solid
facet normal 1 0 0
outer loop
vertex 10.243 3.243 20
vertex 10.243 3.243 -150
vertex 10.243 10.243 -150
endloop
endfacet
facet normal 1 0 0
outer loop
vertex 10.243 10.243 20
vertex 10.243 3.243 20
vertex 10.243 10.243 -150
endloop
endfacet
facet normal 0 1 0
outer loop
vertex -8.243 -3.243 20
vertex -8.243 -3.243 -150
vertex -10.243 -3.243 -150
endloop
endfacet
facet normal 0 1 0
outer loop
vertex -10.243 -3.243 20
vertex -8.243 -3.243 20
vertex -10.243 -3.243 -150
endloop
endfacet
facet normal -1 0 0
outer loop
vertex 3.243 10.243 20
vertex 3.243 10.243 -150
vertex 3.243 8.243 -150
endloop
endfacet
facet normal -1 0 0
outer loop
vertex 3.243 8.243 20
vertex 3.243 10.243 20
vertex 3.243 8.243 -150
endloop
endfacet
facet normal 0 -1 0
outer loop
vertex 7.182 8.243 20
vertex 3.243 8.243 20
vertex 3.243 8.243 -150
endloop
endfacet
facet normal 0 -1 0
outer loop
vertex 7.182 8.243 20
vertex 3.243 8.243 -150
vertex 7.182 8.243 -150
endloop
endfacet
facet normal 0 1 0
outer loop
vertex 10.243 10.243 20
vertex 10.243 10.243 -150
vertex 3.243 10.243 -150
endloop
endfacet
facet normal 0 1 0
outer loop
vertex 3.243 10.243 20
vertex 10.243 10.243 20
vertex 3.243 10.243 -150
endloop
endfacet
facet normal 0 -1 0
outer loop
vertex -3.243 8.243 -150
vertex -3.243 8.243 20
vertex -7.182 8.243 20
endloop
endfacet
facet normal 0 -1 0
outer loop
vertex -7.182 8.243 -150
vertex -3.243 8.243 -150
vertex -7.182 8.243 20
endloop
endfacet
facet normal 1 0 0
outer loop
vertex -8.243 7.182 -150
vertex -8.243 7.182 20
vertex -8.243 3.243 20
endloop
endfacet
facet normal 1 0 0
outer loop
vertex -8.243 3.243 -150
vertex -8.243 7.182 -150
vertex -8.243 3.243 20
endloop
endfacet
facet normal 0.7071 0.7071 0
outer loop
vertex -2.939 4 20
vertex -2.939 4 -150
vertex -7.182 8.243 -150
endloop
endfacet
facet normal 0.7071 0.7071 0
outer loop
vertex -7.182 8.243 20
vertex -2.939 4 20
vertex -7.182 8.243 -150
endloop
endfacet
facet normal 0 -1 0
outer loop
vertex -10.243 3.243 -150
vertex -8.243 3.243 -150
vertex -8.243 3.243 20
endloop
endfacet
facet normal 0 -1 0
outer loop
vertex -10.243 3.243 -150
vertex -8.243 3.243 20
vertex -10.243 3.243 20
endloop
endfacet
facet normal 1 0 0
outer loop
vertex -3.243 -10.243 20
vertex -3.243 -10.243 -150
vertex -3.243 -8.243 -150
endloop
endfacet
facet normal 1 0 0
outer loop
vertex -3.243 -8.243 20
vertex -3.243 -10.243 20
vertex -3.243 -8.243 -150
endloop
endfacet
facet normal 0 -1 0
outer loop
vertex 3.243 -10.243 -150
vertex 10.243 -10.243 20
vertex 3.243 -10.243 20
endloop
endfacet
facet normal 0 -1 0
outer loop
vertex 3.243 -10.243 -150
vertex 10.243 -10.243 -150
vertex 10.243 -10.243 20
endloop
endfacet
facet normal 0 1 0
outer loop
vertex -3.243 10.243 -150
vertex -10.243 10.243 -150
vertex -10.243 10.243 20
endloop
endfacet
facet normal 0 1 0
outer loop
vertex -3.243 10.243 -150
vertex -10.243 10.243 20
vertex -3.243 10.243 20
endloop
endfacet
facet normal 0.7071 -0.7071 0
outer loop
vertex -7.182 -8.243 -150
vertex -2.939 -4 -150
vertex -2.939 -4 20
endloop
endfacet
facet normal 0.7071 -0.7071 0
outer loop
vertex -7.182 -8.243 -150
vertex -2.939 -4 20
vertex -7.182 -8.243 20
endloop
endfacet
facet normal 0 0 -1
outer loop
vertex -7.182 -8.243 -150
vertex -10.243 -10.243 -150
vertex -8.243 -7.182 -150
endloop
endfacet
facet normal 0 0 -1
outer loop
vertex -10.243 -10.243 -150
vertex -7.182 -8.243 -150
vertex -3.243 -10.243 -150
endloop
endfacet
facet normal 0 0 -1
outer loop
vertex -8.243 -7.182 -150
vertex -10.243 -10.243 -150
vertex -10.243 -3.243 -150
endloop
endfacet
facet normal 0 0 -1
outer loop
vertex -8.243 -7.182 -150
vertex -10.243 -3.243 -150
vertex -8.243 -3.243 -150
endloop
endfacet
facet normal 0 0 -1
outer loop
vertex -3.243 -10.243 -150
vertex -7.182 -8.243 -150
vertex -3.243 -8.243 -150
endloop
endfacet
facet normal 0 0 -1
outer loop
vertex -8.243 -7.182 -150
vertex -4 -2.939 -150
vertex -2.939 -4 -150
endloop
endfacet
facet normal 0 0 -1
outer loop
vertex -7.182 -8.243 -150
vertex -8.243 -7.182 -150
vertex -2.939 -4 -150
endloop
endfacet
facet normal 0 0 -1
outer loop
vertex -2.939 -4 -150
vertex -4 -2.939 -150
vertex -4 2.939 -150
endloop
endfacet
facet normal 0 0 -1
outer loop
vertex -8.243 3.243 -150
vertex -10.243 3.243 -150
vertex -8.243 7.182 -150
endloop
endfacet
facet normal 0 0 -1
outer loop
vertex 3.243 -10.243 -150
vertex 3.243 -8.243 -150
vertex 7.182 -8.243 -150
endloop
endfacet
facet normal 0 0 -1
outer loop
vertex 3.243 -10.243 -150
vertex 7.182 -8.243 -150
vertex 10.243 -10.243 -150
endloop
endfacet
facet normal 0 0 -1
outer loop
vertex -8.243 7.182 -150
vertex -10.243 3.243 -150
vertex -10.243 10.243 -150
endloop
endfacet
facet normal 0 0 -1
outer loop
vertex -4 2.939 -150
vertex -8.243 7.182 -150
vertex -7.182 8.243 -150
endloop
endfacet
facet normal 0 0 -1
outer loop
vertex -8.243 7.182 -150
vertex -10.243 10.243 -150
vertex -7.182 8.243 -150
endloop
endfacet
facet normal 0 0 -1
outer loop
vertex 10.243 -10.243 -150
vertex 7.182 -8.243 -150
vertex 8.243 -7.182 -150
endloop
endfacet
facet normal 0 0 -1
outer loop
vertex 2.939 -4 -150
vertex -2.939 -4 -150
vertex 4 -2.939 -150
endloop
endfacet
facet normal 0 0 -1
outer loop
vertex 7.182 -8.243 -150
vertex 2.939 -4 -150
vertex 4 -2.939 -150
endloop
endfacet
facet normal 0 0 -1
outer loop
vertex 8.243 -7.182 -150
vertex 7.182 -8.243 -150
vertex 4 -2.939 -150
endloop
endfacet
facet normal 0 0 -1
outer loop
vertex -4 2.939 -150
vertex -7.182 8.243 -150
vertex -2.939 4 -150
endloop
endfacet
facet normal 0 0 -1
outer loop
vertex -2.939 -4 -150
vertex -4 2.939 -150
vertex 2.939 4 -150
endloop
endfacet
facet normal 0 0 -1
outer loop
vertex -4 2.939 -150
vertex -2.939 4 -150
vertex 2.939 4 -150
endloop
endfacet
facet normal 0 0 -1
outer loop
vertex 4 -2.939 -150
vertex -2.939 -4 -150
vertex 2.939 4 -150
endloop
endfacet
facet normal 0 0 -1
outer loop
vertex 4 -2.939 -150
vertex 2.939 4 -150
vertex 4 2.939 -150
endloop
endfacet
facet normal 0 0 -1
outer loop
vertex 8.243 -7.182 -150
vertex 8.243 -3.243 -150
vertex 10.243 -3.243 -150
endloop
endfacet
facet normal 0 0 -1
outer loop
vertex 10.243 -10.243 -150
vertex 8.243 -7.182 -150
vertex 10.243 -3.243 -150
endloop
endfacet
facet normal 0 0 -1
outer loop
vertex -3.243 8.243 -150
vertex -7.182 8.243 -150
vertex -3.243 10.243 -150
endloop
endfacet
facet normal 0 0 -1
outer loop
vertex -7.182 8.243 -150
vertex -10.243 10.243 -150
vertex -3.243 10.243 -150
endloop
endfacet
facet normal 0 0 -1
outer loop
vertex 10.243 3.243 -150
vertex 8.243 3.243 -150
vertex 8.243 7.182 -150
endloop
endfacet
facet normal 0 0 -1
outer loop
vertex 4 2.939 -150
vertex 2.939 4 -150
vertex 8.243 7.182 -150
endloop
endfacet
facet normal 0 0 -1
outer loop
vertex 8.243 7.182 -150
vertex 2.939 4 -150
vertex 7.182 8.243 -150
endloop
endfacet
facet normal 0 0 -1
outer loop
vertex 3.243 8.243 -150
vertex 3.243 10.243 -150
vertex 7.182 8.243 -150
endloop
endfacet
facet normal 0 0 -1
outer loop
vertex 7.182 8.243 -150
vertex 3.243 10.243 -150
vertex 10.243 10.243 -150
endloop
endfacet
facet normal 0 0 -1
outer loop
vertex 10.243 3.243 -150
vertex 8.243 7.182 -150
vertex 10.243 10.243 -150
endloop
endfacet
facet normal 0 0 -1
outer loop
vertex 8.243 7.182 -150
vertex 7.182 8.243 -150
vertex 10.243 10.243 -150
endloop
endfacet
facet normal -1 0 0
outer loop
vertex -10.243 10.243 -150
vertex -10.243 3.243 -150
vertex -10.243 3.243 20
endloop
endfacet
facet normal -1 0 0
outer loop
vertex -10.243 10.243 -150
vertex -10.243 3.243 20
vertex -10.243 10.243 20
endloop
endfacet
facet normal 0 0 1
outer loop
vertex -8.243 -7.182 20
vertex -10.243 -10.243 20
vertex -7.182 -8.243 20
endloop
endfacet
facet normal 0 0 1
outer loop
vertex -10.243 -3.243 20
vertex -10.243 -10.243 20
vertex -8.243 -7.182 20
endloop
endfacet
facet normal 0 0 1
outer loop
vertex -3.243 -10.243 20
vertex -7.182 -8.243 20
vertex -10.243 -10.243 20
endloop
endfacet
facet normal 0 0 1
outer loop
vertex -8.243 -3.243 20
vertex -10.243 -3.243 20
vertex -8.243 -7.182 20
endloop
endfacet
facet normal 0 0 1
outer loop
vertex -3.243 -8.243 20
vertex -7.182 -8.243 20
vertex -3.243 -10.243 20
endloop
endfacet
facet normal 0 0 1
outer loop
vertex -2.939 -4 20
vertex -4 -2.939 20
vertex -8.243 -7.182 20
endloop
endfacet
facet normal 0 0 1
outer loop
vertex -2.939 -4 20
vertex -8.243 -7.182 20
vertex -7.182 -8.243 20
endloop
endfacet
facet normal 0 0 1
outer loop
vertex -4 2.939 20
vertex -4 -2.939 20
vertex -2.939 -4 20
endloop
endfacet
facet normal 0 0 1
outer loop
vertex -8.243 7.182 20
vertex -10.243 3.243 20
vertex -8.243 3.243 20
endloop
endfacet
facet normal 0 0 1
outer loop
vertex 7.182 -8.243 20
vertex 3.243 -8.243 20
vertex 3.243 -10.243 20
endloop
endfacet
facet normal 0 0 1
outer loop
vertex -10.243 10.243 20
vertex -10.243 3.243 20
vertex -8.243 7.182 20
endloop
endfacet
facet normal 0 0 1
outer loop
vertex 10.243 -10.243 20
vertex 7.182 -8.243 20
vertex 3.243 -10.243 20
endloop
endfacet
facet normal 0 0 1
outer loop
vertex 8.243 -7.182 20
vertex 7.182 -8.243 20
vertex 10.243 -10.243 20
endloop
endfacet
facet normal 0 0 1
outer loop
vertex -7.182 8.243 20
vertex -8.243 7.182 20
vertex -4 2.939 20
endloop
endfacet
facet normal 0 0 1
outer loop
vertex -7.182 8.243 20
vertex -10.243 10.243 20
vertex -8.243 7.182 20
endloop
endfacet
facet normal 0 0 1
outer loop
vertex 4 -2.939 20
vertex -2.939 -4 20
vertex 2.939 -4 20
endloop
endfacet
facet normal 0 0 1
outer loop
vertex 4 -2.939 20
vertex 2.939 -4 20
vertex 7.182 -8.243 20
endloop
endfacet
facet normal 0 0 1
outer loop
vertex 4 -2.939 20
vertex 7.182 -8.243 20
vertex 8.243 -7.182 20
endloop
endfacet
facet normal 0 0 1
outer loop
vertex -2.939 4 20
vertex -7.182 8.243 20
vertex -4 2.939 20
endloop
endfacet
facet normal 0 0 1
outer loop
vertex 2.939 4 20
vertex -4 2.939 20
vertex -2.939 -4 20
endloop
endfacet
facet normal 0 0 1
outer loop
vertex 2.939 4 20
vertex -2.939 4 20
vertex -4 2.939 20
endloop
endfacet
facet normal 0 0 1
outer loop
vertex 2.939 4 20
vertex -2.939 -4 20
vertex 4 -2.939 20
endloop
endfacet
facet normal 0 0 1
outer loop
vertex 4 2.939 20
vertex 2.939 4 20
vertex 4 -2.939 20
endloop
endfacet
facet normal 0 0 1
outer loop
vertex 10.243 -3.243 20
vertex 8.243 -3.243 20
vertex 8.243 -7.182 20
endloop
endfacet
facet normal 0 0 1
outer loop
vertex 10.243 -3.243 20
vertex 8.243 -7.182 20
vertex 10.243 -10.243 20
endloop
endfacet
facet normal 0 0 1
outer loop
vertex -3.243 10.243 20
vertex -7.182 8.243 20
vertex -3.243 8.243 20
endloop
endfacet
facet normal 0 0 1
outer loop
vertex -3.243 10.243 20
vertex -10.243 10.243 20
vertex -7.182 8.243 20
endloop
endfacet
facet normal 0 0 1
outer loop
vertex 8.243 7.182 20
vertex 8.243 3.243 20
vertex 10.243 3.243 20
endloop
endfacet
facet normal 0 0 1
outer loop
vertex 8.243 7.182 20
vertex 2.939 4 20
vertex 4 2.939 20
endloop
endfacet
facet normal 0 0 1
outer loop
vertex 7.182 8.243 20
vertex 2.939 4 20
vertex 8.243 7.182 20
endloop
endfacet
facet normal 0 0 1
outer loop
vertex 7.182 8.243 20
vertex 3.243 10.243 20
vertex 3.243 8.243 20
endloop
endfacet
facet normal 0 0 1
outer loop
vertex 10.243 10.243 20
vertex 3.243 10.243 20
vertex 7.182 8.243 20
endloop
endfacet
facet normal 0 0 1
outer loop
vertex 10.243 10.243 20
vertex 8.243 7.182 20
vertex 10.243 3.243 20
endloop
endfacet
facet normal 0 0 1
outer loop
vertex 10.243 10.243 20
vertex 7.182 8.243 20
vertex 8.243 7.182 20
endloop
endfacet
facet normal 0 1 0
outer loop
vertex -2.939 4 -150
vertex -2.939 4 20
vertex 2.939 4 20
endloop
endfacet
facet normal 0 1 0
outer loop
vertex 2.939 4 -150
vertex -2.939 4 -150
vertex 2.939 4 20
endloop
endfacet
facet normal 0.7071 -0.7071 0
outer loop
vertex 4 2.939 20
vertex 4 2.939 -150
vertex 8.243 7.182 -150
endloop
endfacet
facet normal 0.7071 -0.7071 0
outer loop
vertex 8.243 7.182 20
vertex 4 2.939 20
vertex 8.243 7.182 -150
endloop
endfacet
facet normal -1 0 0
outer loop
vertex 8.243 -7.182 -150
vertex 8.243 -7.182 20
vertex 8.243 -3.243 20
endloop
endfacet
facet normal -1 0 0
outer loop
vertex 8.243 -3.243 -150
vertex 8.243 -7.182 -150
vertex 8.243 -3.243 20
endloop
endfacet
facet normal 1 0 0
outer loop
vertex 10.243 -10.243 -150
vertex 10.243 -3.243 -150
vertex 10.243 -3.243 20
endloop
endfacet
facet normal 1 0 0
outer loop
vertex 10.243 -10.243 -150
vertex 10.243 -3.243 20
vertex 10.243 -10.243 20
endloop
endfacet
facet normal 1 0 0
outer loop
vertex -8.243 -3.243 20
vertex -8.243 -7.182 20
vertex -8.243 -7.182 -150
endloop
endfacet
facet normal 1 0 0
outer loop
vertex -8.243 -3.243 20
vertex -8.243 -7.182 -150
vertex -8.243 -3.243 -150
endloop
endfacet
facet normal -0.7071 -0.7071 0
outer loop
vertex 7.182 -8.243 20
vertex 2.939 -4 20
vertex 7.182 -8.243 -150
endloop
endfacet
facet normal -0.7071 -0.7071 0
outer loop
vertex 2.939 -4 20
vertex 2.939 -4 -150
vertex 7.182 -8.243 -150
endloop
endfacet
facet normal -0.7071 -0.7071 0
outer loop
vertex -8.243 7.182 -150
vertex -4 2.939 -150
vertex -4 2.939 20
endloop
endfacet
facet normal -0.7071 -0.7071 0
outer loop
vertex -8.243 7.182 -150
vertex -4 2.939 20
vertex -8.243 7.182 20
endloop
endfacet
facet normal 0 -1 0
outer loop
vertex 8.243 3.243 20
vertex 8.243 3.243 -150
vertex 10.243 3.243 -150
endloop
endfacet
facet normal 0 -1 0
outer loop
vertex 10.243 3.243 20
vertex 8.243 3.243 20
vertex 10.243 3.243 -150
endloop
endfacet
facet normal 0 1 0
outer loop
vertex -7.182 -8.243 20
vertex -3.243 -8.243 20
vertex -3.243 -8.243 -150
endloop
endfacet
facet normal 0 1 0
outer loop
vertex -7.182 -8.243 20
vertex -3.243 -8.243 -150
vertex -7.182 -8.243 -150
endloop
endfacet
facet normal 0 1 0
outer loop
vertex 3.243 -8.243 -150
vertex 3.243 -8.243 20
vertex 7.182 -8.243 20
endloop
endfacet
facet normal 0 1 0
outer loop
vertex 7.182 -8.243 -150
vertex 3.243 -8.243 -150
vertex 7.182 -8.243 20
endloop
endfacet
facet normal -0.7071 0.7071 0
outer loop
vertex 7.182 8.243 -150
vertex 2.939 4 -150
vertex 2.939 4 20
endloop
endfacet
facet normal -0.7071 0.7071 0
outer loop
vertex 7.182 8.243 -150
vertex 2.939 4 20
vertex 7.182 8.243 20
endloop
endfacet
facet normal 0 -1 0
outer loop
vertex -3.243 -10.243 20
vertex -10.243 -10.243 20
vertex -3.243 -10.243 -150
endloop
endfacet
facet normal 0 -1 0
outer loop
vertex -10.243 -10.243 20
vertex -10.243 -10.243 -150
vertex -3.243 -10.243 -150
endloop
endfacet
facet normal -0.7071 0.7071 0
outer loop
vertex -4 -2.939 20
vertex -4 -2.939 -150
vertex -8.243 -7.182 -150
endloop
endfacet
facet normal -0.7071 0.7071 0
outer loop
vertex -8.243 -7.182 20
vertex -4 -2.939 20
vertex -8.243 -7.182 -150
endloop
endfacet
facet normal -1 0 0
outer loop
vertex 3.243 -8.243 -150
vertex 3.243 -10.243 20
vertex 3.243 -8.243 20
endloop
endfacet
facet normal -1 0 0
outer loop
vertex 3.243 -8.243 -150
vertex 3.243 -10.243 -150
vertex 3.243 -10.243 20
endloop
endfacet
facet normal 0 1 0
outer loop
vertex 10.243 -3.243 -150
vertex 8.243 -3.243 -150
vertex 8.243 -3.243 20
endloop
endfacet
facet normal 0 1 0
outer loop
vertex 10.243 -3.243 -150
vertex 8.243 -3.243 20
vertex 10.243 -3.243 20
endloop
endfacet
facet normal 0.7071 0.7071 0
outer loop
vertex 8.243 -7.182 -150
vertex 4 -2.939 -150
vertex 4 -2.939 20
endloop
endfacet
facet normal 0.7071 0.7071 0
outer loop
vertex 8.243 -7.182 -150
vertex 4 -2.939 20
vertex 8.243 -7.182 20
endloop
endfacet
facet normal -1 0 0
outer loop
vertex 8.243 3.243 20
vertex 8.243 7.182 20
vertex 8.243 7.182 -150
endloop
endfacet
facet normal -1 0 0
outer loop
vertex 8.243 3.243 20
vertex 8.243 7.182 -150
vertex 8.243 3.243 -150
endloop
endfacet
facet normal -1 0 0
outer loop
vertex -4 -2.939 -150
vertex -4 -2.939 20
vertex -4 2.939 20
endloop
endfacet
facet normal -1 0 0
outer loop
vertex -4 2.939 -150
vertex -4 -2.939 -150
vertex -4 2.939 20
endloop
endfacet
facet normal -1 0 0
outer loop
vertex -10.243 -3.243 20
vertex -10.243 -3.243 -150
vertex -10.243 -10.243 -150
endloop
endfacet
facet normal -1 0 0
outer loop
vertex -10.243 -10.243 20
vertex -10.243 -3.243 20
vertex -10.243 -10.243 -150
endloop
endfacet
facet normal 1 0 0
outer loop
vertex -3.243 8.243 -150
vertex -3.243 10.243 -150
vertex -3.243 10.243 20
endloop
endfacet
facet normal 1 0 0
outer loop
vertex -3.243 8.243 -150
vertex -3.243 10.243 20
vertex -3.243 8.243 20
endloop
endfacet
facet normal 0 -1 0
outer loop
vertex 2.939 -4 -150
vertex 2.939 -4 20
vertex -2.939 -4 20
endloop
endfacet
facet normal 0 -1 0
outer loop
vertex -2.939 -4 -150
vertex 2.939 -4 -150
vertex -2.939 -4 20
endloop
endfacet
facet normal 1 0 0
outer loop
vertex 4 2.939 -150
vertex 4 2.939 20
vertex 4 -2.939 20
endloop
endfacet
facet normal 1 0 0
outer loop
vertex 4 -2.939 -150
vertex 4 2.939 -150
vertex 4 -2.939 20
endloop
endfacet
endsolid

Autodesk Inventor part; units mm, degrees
ref_plane "YZ Plane" through (0, 0, 0) normal (1, 0, 0) x (0, 1, 0)
ref_plane "XZ Plane" through (0, 0, 0) normal (0, 1, 0) x (-1, 0, 0)
ref_plane "XY Plane" through (0, 0, 0) normal (0, 0, 1) x (1, 0, 0)
sketch "Sketch1" plane through (0, 0, 0) normal (0, 0, 1) x (1, 0, 0)
  line L0 (-2.9393, 4) -> (2.9393, 4)
  line L1 (4, 2.9393) -> (4, -2.9393)
  line L2 (2.9393, -4) -> (-2.9393, -4)
  line L3 (-4, -2.9393) -> (-4, 2.9393)
  line L4 (0, 0) -> (4, -4) construction
  line L5 (-0.5303, -0.5303) -> (-4, -4) construction
  line L6 (5.0607, 4) -> (10, 4) construction
  line L7 (8.2426, 7.182) -> (8.2426, 3.2426)
  line L8 (8.2426, 3.2426) -> (10.2426, 3.2426)
  line L9 (10.2426, 3.2426) -> (10.2426, 10.2426)
  line L10 (10.2426, 10.2426) -> (3.2426, 10.2426)
  line L11 (3.2426, 10.2426) -> (3.2426, 8.2426)
  line L12 (3.2426, 8.2426) -> (7.182, 8.2426)
  line L13 (2.9393, 4) -> (7.182, 8.2426)
  line L14 (4, 2.9393) -> (8.2426, 7.182)
  line L15 (-8.2426, 7.182) -> (-8.2426, 3.2426)
  line L16 (-8.2426, 3.2426) -> (-10.2426, 3.2426)
  line L17 (-10.2426, 3.2426) -> (-10.2426, 10.2426)
  line L18 (-10.2426, 10.2426) -> (-3.2426, 10.2426)
  line L19 (-3.2426, 10.2426) -> (-3.2426, 8.2426)
  line L20 (-3.2426, 8.2426) -> (-7.182, 8.2426)
  line L21 (-2.9393, 4) -> (-7.182, 8.2426)
  line L22 (-4, 2.9393) -> (-8.2426, 7.182)
  line L23 (-2.9393, -4) -> (2.9393, -4)
  line L24 (4, -2.9393) -> (4, 2.9393)
  line L25 (-4, 2.9393) -> (-4, -2.9393)
  line L26 (-4, -4) -> (0, 0) construction
  line L27 (5.0607, -4) -> (10, -4) construction
  line L28 (8.2426, -7.182) -> (8.2426, -3.2426)
  line L29 (8.2426, -3.2426) -> (10.2426, -3.2426)
  line L30 (10.2426, -3.2426) -> (10.2426, -10.2426)
  line L31 (10.2426, -10.2426) -> (3.2426, -10.2426)
  line L32 (3.2426, -10.2426) -> (3.2426, -8.2426)
  line L33 (3.2426, -8.2426) -> (7.182, -8.2426)
  line L34 (2.9393, -4) -> (7.182, -8.2426)
  line L35 (4, -2.9393) -> (8.2426, -7.182)
  line L36 (-3.2426, -10.2426) -> (-3.2426, -8.2426)
  line L37 (-2.9393, -4) -> (-7.182, -8.2426)
  line L38 (-8.2426, -7.182) -> (-8.2426, -3.2426)
  line L39 (-3.2426, -8.2426) -> (-7.182, -8.2426)
  line L40 (-4, -2.9393) -> (-8.2426, -7.182)
  line L41 (-10.2426, -3.2426) -> (-10.2426, -10.2426)
  line L42 (-10.2426, -10.2426) -> (-3.2426, -10.2426)
  line L43 (-8.2426, -3.2426) -> (-10.2426, -3.2426)
  point P0 (0, 0)
  point P1 (-4, 4)
  point P2 (-4, 4)
  dimension "d0" = 8
extrude "Extrusion1" add sketch "Sketch1" along normal mid plane 300
move faces "이동3" translate (0, 0, 80) faces at (-1.3333, 0.9798, 150)
move faces "이동4" translate (0, 0, -41) faces at (-1.3333, 1.6869, 230)
move faces "이동5" translate (0, 0, -169) faces at (-1.3333, 1.6869, 189)
properties part number "Beam 380 mm"
